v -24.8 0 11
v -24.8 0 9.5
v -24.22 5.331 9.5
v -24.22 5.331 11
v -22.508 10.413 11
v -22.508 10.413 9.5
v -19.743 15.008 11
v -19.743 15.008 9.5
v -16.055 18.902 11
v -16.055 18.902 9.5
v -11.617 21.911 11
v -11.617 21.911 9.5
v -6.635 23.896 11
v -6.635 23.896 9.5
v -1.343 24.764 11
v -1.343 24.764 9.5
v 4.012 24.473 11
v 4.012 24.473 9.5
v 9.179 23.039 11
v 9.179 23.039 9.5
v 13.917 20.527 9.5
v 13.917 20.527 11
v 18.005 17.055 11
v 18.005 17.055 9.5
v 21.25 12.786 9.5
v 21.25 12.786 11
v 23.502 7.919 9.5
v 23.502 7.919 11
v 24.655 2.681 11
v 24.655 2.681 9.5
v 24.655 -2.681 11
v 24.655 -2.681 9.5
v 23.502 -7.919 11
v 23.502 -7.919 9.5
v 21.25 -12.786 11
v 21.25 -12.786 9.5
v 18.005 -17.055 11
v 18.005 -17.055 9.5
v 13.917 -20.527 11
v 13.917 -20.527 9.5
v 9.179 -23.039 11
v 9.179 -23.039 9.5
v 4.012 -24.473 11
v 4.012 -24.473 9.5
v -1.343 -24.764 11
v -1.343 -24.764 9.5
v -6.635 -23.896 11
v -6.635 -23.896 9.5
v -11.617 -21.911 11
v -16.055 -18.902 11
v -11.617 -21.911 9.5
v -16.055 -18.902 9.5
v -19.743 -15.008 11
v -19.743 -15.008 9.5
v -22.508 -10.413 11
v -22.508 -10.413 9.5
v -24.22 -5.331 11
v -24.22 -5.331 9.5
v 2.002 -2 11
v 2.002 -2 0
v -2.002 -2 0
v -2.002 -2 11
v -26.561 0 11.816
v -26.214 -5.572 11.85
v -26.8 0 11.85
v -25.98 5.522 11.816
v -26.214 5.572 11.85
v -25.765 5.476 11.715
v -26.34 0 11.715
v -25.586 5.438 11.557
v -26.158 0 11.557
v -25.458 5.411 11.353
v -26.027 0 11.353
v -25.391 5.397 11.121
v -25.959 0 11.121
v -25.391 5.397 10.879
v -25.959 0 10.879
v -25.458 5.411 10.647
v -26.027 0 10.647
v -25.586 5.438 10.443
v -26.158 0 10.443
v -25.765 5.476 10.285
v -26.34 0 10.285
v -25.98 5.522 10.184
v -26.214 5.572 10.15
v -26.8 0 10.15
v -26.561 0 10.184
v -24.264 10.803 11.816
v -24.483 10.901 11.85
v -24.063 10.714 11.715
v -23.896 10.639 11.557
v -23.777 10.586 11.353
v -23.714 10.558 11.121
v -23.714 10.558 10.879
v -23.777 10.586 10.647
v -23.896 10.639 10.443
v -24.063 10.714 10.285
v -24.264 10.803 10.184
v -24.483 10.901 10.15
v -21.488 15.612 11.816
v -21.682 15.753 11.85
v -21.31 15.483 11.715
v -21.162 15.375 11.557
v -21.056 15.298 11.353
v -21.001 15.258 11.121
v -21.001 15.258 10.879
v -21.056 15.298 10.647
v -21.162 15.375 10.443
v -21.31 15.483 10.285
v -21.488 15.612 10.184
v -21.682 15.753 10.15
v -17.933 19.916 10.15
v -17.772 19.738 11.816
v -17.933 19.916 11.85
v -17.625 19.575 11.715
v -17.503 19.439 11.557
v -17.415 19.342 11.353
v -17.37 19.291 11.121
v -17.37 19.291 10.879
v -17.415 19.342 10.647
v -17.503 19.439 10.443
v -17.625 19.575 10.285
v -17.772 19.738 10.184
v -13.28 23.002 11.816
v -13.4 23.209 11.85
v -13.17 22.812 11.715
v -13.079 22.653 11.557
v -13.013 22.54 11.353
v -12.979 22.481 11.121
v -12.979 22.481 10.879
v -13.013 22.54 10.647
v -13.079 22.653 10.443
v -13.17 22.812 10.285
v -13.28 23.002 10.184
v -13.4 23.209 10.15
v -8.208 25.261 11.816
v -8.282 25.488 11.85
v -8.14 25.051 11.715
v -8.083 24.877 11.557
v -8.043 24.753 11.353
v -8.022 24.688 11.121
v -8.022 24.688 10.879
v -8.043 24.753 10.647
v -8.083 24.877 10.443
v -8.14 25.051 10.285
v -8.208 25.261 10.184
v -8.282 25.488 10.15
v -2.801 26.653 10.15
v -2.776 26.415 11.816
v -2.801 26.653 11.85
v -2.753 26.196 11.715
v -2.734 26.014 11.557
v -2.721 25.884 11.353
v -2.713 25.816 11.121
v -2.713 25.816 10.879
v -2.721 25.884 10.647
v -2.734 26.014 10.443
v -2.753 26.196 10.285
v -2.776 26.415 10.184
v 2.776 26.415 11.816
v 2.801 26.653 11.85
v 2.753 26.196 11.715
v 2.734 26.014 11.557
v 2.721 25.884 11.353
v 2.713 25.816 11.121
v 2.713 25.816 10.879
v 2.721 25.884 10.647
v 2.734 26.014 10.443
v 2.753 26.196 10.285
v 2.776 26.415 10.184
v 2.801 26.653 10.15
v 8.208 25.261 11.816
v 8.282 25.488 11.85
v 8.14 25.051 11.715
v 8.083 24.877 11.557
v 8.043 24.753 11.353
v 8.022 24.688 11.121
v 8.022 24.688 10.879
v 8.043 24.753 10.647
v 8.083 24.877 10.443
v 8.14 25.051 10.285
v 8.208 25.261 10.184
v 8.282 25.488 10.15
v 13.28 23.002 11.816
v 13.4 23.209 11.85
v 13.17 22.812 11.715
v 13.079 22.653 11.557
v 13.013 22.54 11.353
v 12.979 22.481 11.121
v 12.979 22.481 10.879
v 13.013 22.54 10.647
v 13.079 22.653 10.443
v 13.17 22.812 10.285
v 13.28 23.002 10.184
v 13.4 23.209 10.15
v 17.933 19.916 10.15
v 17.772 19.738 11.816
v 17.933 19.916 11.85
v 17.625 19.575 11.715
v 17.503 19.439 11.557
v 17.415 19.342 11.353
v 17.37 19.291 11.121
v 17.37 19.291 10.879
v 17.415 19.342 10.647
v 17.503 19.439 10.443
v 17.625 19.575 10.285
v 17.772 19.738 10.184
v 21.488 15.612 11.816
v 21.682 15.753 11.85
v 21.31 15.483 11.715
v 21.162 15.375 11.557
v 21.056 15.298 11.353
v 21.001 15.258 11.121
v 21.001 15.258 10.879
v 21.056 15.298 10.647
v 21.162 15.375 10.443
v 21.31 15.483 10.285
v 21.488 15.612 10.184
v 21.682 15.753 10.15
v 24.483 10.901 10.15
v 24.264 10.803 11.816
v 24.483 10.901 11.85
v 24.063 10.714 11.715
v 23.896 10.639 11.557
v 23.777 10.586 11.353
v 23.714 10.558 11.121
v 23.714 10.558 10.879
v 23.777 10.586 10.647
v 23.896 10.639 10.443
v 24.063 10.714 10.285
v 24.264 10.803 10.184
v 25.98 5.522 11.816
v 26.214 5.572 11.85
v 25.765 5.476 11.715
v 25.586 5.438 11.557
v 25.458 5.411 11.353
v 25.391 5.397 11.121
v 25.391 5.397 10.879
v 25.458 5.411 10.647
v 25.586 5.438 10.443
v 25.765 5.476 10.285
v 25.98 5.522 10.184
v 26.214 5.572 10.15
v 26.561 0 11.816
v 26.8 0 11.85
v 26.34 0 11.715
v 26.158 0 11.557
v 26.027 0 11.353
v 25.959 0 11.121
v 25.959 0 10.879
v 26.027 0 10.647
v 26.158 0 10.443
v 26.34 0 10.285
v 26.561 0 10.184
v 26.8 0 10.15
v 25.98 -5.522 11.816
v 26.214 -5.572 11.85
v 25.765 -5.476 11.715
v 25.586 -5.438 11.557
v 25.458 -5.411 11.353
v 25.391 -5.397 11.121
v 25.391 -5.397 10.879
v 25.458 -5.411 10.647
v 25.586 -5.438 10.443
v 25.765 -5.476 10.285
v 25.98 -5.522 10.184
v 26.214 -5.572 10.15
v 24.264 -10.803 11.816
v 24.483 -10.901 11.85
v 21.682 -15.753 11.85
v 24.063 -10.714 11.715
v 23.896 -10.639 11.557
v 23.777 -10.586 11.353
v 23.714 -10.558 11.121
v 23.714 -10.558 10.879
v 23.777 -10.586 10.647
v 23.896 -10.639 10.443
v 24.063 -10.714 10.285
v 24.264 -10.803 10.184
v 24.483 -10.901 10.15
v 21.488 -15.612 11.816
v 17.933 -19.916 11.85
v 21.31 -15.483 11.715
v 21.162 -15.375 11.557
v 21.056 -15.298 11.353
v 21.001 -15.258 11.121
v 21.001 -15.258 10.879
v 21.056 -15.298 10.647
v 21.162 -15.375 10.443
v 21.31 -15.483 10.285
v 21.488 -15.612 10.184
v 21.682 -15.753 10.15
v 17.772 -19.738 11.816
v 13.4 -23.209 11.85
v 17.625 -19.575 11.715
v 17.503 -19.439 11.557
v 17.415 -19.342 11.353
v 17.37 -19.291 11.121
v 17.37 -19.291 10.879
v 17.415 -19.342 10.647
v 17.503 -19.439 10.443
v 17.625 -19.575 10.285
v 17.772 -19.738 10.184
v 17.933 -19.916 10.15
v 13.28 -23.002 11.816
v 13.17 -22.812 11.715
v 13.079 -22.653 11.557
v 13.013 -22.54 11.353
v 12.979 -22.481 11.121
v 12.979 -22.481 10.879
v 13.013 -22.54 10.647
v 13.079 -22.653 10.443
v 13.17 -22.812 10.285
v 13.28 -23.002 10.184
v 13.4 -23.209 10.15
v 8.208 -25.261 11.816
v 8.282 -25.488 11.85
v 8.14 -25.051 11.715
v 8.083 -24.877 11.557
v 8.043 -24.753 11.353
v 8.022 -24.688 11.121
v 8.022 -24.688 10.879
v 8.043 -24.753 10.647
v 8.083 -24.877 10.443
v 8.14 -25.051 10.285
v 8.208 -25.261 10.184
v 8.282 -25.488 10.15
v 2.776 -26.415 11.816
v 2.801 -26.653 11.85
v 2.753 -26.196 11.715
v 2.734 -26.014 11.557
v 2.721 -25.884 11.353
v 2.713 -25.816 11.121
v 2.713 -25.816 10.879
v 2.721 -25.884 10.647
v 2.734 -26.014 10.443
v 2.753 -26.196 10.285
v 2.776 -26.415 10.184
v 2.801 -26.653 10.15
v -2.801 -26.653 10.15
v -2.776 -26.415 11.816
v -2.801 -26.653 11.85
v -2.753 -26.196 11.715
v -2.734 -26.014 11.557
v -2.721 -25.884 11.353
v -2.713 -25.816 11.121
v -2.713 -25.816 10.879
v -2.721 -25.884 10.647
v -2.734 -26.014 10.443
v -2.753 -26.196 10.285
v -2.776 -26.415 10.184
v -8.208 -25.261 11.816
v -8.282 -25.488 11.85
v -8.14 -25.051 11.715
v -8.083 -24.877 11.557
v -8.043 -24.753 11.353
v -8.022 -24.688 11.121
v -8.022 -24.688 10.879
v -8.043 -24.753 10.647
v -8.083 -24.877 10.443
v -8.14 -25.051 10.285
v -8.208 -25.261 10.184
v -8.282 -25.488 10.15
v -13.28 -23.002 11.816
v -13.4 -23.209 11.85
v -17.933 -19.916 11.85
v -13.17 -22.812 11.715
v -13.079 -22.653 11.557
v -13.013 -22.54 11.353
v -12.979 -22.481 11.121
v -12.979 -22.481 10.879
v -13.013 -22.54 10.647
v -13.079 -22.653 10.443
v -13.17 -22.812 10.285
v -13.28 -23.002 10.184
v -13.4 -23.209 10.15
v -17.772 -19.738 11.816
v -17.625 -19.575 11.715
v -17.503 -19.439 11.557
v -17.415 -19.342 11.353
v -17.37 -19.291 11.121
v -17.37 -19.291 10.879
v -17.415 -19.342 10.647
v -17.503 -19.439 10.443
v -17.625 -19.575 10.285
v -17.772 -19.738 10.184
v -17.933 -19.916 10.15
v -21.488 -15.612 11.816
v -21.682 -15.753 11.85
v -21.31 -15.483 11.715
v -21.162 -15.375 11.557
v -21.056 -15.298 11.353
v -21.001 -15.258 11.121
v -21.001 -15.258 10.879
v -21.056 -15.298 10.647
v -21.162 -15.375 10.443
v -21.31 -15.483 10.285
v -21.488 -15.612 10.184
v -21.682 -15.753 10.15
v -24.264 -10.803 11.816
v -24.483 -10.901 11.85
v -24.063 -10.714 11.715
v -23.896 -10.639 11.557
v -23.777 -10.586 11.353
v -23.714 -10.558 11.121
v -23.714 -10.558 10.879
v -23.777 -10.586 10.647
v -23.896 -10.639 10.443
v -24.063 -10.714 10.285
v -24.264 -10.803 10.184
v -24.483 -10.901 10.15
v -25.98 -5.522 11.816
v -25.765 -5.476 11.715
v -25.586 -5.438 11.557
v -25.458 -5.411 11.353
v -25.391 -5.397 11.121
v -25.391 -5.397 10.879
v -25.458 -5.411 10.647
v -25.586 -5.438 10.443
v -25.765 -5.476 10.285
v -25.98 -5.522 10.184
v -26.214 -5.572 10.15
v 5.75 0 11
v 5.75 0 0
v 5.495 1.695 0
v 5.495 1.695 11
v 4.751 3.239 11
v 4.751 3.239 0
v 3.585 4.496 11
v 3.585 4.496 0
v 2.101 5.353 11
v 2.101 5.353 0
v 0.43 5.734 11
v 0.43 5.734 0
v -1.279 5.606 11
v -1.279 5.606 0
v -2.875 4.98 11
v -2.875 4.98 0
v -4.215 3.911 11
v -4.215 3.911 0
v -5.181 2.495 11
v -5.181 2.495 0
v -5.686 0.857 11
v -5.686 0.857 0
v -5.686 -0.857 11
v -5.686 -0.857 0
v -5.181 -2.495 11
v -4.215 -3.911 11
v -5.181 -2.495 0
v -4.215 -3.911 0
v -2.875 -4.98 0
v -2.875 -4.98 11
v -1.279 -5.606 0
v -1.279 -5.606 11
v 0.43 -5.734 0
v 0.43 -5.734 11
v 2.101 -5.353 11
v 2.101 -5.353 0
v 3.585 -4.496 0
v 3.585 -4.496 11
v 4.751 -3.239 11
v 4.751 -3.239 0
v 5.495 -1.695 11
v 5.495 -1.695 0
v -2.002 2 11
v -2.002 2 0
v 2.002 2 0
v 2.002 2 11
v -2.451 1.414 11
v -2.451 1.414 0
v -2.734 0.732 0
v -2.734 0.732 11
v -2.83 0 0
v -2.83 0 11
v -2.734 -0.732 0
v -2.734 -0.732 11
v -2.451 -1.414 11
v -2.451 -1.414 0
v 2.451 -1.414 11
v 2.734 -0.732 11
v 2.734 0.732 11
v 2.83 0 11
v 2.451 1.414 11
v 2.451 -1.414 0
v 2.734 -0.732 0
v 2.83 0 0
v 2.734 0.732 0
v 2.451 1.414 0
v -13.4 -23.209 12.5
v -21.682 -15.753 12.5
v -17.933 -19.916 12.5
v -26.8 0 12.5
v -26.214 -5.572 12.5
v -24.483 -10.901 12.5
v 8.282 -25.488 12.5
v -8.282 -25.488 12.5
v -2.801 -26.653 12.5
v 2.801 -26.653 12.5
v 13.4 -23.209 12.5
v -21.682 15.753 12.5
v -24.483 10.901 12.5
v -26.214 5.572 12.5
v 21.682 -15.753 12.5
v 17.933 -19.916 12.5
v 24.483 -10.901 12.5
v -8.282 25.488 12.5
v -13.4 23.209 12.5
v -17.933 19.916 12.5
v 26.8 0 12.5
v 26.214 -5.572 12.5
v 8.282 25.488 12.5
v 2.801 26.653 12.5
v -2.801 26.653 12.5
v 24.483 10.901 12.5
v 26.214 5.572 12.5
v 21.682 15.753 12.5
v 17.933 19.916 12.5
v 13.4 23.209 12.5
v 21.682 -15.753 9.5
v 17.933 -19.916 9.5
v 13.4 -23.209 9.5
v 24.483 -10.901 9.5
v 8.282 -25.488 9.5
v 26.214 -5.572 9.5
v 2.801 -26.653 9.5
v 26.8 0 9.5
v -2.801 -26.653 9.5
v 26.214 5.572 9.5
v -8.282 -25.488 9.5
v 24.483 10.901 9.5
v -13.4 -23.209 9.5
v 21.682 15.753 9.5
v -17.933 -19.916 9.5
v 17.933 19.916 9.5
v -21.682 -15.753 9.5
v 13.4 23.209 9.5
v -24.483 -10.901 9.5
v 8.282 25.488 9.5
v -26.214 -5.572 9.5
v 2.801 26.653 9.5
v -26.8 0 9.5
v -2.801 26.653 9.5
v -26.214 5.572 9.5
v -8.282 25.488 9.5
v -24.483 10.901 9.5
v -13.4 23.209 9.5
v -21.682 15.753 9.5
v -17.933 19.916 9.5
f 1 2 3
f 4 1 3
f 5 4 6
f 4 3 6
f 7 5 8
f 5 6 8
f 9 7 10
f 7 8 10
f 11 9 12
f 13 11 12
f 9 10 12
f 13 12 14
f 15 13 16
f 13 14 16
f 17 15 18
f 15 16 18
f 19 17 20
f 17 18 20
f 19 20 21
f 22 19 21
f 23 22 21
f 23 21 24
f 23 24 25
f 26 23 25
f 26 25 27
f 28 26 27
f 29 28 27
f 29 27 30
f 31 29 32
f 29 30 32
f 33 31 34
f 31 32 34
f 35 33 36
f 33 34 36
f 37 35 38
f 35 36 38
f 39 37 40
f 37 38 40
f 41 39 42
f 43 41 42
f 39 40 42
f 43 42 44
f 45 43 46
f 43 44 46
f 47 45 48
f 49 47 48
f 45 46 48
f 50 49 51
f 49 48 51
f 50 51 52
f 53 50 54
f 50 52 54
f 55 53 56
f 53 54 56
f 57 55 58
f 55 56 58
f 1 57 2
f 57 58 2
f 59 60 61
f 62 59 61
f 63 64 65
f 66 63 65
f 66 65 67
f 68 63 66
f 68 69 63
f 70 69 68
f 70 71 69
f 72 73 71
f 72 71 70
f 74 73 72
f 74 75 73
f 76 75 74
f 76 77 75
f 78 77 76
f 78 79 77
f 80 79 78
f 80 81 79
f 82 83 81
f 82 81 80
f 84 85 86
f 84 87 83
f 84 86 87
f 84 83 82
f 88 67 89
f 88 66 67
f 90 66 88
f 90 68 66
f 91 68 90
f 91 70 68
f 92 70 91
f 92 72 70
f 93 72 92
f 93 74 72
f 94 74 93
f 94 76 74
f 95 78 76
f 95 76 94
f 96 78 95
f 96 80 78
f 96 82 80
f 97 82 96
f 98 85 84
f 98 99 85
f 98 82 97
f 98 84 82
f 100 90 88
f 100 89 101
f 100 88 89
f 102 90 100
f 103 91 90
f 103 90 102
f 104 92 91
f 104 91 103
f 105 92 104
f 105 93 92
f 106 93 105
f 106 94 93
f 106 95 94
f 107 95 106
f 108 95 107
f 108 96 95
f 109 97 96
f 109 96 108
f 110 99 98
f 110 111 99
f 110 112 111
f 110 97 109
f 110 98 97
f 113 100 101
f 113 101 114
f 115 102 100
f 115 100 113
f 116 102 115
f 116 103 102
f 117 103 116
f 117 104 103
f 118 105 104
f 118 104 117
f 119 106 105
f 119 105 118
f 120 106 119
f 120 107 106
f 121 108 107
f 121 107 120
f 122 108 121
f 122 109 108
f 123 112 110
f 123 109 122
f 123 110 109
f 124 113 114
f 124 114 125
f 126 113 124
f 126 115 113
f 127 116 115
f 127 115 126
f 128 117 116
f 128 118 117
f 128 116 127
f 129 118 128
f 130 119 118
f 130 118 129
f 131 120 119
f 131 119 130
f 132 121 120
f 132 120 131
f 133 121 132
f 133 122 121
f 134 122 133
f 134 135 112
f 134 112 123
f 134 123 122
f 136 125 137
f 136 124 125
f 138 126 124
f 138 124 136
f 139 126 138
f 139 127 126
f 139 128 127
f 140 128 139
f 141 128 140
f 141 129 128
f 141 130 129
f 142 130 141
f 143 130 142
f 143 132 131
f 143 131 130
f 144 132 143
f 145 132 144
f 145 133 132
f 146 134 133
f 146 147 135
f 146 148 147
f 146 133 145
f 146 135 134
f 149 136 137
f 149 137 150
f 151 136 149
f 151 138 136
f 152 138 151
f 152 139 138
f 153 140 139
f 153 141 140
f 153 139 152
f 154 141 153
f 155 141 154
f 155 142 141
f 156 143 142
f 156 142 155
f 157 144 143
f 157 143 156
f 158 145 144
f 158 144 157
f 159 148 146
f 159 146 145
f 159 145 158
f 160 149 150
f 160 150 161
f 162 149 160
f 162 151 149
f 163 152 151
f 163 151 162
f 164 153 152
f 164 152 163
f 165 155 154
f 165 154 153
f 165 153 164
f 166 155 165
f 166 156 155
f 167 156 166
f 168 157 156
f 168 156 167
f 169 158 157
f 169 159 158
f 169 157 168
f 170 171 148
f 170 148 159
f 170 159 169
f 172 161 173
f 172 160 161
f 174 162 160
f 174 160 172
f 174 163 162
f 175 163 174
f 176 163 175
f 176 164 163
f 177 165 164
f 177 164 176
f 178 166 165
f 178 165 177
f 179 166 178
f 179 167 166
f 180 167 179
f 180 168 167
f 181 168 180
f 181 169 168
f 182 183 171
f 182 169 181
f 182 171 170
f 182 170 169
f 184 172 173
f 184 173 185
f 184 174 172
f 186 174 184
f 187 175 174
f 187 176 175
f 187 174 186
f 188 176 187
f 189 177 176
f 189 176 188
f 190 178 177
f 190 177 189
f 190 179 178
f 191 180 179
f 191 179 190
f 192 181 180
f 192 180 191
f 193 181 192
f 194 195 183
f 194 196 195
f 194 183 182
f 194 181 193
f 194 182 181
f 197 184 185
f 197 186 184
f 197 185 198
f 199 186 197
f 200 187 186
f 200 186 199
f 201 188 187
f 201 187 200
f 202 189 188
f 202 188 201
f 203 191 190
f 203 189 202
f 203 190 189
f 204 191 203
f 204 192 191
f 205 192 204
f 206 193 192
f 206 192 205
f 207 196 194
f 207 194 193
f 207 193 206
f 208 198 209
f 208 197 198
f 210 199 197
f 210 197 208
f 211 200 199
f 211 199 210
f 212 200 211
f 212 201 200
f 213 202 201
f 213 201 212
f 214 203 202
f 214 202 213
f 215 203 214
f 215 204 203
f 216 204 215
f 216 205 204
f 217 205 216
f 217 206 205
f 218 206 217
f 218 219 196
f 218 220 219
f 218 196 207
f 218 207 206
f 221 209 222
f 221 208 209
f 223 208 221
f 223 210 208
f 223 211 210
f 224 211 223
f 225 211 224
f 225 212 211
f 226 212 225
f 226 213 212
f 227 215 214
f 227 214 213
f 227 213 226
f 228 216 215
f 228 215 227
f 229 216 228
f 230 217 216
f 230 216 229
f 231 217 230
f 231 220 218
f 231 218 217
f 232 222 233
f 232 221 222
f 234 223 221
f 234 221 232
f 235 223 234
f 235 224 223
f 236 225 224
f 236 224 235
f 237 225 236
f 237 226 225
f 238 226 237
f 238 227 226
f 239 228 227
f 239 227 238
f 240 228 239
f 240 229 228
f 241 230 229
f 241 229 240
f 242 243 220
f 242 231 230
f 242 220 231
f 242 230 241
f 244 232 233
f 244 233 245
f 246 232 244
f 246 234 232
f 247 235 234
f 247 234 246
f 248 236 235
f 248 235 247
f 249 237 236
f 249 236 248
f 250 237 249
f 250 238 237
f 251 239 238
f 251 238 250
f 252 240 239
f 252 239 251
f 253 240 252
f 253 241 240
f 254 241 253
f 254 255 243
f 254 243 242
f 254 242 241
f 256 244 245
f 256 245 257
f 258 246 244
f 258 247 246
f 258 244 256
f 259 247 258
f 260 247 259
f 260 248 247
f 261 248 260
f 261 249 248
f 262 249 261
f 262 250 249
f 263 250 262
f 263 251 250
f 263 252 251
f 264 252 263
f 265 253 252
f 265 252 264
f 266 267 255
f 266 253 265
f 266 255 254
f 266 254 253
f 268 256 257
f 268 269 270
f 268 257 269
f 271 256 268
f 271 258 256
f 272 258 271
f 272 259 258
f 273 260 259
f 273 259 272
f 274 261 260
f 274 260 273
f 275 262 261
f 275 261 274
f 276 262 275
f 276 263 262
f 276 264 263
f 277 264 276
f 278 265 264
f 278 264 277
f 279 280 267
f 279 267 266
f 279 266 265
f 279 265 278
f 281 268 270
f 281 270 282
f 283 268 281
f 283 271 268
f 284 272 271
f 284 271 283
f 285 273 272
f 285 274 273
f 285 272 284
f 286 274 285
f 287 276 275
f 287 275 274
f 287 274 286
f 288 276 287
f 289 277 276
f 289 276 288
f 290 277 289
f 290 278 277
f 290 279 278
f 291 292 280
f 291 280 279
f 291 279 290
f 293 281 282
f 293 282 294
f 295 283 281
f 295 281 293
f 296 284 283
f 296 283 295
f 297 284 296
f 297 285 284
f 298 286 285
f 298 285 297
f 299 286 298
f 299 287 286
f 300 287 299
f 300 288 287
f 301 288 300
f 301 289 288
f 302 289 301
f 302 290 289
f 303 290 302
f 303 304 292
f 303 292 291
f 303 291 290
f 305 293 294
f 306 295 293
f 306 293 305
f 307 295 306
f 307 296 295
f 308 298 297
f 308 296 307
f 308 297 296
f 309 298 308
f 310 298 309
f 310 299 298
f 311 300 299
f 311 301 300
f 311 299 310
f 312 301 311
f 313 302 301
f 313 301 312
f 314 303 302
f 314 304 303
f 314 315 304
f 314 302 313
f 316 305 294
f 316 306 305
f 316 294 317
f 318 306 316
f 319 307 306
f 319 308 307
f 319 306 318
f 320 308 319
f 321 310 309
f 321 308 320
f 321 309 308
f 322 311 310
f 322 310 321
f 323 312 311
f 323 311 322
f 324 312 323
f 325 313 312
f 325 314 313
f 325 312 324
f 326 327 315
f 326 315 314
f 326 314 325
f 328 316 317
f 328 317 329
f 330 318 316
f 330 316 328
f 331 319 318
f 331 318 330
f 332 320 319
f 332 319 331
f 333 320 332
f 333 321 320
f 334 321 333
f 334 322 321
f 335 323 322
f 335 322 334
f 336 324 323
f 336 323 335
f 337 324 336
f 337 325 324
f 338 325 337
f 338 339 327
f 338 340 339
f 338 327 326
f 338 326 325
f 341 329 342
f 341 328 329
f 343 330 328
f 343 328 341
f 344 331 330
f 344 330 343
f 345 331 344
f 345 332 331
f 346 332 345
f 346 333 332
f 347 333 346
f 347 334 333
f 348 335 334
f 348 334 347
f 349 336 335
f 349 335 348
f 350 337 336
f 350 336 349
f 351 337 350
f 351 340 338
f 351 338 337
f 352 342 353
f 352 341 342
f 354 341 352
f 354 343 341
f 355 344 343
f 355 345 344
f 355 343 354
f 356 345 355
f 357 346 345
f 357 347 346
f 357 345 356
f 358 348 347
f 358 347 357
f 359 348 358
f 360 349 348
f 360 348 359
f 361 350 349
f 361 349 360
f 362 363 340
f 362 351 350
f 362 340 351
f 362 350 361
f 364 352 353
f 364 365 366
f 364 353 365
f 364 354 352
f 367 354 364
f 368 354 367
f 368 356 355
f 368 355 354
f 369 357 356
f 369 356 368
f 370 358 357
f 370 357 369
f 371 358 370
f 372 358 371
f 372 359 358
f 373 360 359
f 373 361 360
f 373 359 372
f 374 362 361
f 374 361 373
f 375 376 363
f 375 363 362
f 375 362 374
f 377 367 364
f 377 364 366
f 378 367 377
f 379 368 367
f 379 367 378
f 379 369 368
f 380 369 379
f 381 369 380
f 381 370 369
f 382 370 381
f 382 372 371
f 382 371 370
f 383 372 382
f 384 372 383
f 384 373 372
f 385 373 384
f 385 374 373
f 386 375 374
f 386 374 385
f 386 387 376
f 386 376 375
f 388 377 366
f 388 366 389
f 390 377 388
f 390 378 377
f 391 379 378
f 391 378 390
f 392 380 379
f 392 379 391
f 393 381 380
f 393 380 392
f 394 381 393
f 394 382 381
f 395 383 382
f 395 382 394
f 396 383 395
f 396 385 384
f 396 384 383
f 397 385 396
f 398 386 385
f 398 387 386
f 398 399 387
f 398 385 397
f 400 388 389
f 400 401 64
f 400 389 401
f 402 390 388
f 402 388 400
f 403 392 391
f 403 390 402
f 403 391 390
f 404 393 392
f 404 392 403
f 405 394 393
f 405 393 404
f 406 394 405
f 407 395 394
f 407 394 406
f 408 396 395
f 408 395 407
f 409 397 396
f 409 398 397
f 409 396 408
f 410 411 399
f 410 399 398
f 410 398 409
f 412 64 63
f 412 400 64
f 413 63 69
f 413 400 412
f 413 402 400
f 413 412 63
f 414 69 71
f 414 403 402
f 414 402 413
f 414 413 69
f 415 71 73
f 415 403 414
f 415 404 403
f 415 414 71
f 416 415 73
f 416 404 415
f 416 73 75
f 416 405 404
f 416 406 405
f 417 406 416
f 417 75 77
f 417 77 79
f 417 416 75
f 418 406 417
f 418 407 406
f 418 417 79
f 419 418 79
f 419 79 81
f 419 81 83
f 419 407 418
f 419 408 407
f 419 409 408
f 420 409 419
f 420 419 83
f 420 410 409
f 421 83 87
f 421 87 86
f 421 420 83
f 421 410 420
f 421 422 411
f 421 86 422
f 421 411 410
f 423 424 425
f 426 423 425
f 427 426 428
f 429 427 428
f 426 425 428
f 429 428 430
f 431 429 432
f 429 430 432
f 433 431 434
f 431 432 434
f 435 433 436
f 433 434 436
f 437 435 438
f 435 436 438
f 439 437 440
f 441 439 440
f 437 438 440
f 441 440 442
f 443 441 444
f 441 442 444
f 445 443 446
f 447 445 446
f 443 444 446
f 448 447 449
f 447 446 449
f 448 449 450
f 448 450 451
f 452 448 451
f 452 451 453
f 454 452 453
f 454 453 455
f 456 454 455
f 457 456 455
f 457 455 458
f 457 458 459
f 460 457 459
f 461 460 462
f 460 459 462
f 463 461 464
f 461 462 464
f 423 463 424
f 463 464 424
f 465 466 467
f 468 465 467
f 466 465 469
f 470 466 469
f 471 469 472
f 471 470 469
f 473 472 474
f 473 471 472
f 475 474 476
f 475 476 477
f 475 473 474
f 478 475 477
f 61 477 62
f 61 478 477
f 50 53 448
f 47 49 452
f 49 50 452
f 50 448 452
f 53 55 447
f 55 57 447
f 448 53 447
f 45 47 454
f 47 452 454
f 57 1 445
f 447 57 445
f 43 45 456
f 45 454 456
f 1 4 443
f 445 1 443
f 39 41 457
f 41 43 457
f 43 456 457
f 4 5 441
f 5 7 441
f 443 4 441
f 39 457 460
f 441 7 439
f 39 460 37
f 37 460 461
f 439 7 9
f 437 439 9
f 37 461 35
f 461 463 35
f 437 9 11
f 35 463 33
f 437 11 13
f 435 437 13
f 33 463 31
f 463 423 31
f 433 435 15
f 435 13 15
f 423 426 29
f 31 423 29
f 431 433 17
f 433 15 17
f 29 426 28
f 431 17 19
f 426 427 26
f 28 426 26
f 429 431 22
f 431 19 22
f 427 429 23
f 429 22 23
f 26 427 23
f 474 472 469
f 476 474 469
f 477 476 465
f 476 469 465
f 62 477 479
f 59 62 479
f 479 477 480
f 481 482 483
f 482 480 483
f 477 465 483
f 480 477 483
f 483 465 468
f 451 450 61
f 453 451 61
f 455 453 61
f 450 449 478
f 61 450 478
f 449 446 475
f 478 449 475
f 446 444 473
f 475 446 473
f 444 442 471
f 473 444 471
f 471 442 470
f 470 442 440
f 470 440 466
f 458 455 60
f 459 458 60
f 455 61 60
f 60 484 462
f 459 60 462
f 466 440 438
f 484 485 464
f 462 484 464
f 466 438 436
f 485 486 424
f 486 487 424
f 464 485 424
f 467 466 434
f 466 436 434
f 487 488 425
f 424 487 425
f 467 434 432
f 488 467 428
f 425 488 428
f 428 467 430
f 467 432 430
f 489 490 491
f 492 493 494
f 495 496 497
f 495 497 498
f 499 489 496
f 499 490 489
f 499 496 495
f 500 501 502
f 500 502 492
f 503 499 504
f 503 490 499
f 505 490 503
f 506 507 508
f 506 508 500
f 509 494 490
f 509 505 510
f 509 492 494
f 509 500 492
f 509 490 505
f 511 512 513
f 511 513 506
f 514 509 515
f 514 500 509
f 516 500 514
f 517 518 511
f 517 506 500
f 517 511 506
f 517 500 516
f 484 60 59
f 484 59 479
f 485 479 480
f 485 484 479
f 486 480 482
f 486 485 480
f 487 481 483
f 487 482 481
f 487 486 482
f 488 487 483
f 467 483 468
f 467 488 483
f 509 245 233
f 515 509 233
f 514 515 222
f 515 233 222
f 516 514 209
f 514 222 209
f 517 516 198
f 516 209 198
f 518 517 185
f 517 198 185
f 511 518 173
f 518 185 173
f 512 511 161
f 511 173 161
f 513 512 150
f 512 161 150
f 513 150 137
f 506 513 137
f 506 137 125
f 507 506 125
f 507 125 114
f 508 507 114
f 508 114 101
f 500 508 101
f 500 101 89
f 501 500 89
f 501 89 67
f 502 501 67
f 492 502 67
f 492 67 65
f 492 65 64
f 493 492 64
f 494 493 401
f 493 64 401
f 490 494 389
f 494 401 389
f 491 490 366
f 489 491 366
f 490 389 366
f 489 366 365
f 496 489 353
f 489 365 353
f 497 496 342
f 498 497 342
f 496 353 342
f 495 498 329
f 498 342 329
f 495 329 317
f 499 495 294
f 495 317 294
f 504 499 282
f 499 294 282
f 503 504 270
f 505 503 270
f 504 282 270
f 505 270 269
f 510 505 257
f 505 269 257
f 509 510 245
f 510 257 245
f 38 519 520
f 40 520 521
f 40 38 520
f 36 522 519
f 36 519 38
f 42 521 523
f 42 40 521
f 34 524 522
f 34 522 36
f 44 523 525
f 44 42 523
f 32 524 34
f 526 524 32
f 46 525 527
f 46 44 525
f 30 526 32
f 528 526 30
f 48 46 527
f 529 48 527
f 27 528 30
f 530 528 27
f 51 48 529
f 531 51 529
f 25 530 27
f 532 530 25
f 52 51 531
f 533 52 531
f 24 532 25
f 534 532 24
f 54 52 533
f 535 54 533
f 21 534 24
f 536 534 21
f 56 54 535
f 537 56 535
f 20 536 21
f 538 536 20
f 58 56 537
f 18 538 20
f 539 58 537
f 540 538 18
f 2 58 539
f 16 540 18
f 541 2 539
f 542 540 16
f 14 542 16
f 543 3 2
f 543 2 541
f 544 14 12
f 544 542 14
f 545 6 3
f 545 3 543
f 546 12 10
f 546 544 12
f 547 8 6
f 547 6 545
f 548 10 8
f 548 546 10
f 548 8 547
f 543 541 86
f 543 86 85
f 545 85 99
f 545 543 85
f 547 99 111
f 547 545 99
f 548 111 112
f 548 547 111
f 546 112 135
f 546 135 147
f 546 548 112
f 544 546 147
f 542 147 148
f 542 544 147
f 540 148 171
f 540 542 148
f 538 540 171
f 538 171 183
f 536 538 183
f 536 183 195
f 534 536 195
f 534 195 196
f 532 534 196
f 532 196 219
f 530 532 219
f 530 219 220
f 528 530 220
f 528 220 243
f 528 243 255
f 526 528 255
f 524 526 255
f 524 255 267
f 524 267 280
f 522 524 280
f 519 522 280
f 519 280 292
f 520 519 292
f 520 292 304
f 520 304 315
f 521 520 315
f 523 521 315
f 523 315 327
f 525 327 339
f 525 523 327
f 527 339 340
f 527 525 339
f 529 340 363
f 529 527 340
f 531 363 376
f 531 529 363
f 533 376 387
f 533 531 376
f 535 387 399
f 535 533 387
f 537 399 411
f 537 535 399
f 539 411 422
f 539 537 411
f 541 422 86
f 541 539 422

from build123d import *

# Parameters (mm, degrees)
SKETCH_1_R      = 5.75
SKETCH_1_R_2    = 2.83
EXTRUDE_1_DEPTH = 11
SKETCH_2_R      = 26.8
EXTRUDE_2_DEPTH = 1.5
EXTRUDE_START   = 1.5
SKETCH_3_R      = 26.8
SKETCH_3_R_2    = 24.8
EXTRUDE_3_DEPTH = 1.5
SKETCH_4_R      = 0.85


with BuildPart() as part:
    # Эскиз1 → Бобышка-Вытянуть1 (new body)
    # profile 1 of 3: a face of its own
    with BuildSketch(Plane.XY):
        Circle(SKETCH_1_R)
        Circle(SKETCH_1_R_2, mode=Mode.SUBTRACT)
    # profile 2 of 3: a face of its own
    with BuildSketch(Plane.XY):
        with BuildLine():
            ThreePointArc((2.002223764, 2), (0, 2.83), (-2.002223764, 2))
            Line((-2.002223764, 2), (2.002223764, 2))
        make_face()
    # profile 3 of 3: a face of its own
    with BuildSketch(Plane.XY):
        with BuildLine():
            Line((2.002223764, -2), (-2.002223764, -2))
            ThreePointArc((-2.002223764, -2), (0, -2.83), (2.002223764, -2))
        make_face()
    extrude(amount=EXTRUDE_1_DEPTH)

    # Эскиз2 → Бобышка-Вытянуть2 (add)
    with BuildSketch(Plane.XY.offset(11)):
        Circle(SKETCH_2_R)
    extrude(amount=EXTRUDE_2_DEPTH)

    # Эскиз3 → Бобышка-Вытянуть3 (add)
    with BuildSketch(Plane(origin=(0, 0, 11), x_dir=(-1, 0, 0), z_dir=(0, 0, -1)).offset(EXTRUDE_START)):
        Circle(SKETCH_3_R)
        Circle(SKETCH_3_R_2, mode=Mode.SUBTRACT)
    extrude(amount=-EXTRUDE_3_DEPTH)

    # Эскиз4 → Вырез-Повернуть1 (revolve, cut)
    with BuildSketch(Plane(origin=(0, 0, 0), x_dir=(0, 0, -1), z_dir=(1, 0, 0)), mode=Mode.PRIVATE) as cut_revolve_1_sk:
        with Locations((-11, 26.8)):
            Circle(SKETCH_4_R)
    revolve(cut_revolve_1_sk.sketch.rotate(Axis((0, 0, 11), (0, 0, -1)), 270), axis=Axis((0, 0, 11), (0, 0, -1)), mode=Mode.SUBTRACT)


solid = part.part
